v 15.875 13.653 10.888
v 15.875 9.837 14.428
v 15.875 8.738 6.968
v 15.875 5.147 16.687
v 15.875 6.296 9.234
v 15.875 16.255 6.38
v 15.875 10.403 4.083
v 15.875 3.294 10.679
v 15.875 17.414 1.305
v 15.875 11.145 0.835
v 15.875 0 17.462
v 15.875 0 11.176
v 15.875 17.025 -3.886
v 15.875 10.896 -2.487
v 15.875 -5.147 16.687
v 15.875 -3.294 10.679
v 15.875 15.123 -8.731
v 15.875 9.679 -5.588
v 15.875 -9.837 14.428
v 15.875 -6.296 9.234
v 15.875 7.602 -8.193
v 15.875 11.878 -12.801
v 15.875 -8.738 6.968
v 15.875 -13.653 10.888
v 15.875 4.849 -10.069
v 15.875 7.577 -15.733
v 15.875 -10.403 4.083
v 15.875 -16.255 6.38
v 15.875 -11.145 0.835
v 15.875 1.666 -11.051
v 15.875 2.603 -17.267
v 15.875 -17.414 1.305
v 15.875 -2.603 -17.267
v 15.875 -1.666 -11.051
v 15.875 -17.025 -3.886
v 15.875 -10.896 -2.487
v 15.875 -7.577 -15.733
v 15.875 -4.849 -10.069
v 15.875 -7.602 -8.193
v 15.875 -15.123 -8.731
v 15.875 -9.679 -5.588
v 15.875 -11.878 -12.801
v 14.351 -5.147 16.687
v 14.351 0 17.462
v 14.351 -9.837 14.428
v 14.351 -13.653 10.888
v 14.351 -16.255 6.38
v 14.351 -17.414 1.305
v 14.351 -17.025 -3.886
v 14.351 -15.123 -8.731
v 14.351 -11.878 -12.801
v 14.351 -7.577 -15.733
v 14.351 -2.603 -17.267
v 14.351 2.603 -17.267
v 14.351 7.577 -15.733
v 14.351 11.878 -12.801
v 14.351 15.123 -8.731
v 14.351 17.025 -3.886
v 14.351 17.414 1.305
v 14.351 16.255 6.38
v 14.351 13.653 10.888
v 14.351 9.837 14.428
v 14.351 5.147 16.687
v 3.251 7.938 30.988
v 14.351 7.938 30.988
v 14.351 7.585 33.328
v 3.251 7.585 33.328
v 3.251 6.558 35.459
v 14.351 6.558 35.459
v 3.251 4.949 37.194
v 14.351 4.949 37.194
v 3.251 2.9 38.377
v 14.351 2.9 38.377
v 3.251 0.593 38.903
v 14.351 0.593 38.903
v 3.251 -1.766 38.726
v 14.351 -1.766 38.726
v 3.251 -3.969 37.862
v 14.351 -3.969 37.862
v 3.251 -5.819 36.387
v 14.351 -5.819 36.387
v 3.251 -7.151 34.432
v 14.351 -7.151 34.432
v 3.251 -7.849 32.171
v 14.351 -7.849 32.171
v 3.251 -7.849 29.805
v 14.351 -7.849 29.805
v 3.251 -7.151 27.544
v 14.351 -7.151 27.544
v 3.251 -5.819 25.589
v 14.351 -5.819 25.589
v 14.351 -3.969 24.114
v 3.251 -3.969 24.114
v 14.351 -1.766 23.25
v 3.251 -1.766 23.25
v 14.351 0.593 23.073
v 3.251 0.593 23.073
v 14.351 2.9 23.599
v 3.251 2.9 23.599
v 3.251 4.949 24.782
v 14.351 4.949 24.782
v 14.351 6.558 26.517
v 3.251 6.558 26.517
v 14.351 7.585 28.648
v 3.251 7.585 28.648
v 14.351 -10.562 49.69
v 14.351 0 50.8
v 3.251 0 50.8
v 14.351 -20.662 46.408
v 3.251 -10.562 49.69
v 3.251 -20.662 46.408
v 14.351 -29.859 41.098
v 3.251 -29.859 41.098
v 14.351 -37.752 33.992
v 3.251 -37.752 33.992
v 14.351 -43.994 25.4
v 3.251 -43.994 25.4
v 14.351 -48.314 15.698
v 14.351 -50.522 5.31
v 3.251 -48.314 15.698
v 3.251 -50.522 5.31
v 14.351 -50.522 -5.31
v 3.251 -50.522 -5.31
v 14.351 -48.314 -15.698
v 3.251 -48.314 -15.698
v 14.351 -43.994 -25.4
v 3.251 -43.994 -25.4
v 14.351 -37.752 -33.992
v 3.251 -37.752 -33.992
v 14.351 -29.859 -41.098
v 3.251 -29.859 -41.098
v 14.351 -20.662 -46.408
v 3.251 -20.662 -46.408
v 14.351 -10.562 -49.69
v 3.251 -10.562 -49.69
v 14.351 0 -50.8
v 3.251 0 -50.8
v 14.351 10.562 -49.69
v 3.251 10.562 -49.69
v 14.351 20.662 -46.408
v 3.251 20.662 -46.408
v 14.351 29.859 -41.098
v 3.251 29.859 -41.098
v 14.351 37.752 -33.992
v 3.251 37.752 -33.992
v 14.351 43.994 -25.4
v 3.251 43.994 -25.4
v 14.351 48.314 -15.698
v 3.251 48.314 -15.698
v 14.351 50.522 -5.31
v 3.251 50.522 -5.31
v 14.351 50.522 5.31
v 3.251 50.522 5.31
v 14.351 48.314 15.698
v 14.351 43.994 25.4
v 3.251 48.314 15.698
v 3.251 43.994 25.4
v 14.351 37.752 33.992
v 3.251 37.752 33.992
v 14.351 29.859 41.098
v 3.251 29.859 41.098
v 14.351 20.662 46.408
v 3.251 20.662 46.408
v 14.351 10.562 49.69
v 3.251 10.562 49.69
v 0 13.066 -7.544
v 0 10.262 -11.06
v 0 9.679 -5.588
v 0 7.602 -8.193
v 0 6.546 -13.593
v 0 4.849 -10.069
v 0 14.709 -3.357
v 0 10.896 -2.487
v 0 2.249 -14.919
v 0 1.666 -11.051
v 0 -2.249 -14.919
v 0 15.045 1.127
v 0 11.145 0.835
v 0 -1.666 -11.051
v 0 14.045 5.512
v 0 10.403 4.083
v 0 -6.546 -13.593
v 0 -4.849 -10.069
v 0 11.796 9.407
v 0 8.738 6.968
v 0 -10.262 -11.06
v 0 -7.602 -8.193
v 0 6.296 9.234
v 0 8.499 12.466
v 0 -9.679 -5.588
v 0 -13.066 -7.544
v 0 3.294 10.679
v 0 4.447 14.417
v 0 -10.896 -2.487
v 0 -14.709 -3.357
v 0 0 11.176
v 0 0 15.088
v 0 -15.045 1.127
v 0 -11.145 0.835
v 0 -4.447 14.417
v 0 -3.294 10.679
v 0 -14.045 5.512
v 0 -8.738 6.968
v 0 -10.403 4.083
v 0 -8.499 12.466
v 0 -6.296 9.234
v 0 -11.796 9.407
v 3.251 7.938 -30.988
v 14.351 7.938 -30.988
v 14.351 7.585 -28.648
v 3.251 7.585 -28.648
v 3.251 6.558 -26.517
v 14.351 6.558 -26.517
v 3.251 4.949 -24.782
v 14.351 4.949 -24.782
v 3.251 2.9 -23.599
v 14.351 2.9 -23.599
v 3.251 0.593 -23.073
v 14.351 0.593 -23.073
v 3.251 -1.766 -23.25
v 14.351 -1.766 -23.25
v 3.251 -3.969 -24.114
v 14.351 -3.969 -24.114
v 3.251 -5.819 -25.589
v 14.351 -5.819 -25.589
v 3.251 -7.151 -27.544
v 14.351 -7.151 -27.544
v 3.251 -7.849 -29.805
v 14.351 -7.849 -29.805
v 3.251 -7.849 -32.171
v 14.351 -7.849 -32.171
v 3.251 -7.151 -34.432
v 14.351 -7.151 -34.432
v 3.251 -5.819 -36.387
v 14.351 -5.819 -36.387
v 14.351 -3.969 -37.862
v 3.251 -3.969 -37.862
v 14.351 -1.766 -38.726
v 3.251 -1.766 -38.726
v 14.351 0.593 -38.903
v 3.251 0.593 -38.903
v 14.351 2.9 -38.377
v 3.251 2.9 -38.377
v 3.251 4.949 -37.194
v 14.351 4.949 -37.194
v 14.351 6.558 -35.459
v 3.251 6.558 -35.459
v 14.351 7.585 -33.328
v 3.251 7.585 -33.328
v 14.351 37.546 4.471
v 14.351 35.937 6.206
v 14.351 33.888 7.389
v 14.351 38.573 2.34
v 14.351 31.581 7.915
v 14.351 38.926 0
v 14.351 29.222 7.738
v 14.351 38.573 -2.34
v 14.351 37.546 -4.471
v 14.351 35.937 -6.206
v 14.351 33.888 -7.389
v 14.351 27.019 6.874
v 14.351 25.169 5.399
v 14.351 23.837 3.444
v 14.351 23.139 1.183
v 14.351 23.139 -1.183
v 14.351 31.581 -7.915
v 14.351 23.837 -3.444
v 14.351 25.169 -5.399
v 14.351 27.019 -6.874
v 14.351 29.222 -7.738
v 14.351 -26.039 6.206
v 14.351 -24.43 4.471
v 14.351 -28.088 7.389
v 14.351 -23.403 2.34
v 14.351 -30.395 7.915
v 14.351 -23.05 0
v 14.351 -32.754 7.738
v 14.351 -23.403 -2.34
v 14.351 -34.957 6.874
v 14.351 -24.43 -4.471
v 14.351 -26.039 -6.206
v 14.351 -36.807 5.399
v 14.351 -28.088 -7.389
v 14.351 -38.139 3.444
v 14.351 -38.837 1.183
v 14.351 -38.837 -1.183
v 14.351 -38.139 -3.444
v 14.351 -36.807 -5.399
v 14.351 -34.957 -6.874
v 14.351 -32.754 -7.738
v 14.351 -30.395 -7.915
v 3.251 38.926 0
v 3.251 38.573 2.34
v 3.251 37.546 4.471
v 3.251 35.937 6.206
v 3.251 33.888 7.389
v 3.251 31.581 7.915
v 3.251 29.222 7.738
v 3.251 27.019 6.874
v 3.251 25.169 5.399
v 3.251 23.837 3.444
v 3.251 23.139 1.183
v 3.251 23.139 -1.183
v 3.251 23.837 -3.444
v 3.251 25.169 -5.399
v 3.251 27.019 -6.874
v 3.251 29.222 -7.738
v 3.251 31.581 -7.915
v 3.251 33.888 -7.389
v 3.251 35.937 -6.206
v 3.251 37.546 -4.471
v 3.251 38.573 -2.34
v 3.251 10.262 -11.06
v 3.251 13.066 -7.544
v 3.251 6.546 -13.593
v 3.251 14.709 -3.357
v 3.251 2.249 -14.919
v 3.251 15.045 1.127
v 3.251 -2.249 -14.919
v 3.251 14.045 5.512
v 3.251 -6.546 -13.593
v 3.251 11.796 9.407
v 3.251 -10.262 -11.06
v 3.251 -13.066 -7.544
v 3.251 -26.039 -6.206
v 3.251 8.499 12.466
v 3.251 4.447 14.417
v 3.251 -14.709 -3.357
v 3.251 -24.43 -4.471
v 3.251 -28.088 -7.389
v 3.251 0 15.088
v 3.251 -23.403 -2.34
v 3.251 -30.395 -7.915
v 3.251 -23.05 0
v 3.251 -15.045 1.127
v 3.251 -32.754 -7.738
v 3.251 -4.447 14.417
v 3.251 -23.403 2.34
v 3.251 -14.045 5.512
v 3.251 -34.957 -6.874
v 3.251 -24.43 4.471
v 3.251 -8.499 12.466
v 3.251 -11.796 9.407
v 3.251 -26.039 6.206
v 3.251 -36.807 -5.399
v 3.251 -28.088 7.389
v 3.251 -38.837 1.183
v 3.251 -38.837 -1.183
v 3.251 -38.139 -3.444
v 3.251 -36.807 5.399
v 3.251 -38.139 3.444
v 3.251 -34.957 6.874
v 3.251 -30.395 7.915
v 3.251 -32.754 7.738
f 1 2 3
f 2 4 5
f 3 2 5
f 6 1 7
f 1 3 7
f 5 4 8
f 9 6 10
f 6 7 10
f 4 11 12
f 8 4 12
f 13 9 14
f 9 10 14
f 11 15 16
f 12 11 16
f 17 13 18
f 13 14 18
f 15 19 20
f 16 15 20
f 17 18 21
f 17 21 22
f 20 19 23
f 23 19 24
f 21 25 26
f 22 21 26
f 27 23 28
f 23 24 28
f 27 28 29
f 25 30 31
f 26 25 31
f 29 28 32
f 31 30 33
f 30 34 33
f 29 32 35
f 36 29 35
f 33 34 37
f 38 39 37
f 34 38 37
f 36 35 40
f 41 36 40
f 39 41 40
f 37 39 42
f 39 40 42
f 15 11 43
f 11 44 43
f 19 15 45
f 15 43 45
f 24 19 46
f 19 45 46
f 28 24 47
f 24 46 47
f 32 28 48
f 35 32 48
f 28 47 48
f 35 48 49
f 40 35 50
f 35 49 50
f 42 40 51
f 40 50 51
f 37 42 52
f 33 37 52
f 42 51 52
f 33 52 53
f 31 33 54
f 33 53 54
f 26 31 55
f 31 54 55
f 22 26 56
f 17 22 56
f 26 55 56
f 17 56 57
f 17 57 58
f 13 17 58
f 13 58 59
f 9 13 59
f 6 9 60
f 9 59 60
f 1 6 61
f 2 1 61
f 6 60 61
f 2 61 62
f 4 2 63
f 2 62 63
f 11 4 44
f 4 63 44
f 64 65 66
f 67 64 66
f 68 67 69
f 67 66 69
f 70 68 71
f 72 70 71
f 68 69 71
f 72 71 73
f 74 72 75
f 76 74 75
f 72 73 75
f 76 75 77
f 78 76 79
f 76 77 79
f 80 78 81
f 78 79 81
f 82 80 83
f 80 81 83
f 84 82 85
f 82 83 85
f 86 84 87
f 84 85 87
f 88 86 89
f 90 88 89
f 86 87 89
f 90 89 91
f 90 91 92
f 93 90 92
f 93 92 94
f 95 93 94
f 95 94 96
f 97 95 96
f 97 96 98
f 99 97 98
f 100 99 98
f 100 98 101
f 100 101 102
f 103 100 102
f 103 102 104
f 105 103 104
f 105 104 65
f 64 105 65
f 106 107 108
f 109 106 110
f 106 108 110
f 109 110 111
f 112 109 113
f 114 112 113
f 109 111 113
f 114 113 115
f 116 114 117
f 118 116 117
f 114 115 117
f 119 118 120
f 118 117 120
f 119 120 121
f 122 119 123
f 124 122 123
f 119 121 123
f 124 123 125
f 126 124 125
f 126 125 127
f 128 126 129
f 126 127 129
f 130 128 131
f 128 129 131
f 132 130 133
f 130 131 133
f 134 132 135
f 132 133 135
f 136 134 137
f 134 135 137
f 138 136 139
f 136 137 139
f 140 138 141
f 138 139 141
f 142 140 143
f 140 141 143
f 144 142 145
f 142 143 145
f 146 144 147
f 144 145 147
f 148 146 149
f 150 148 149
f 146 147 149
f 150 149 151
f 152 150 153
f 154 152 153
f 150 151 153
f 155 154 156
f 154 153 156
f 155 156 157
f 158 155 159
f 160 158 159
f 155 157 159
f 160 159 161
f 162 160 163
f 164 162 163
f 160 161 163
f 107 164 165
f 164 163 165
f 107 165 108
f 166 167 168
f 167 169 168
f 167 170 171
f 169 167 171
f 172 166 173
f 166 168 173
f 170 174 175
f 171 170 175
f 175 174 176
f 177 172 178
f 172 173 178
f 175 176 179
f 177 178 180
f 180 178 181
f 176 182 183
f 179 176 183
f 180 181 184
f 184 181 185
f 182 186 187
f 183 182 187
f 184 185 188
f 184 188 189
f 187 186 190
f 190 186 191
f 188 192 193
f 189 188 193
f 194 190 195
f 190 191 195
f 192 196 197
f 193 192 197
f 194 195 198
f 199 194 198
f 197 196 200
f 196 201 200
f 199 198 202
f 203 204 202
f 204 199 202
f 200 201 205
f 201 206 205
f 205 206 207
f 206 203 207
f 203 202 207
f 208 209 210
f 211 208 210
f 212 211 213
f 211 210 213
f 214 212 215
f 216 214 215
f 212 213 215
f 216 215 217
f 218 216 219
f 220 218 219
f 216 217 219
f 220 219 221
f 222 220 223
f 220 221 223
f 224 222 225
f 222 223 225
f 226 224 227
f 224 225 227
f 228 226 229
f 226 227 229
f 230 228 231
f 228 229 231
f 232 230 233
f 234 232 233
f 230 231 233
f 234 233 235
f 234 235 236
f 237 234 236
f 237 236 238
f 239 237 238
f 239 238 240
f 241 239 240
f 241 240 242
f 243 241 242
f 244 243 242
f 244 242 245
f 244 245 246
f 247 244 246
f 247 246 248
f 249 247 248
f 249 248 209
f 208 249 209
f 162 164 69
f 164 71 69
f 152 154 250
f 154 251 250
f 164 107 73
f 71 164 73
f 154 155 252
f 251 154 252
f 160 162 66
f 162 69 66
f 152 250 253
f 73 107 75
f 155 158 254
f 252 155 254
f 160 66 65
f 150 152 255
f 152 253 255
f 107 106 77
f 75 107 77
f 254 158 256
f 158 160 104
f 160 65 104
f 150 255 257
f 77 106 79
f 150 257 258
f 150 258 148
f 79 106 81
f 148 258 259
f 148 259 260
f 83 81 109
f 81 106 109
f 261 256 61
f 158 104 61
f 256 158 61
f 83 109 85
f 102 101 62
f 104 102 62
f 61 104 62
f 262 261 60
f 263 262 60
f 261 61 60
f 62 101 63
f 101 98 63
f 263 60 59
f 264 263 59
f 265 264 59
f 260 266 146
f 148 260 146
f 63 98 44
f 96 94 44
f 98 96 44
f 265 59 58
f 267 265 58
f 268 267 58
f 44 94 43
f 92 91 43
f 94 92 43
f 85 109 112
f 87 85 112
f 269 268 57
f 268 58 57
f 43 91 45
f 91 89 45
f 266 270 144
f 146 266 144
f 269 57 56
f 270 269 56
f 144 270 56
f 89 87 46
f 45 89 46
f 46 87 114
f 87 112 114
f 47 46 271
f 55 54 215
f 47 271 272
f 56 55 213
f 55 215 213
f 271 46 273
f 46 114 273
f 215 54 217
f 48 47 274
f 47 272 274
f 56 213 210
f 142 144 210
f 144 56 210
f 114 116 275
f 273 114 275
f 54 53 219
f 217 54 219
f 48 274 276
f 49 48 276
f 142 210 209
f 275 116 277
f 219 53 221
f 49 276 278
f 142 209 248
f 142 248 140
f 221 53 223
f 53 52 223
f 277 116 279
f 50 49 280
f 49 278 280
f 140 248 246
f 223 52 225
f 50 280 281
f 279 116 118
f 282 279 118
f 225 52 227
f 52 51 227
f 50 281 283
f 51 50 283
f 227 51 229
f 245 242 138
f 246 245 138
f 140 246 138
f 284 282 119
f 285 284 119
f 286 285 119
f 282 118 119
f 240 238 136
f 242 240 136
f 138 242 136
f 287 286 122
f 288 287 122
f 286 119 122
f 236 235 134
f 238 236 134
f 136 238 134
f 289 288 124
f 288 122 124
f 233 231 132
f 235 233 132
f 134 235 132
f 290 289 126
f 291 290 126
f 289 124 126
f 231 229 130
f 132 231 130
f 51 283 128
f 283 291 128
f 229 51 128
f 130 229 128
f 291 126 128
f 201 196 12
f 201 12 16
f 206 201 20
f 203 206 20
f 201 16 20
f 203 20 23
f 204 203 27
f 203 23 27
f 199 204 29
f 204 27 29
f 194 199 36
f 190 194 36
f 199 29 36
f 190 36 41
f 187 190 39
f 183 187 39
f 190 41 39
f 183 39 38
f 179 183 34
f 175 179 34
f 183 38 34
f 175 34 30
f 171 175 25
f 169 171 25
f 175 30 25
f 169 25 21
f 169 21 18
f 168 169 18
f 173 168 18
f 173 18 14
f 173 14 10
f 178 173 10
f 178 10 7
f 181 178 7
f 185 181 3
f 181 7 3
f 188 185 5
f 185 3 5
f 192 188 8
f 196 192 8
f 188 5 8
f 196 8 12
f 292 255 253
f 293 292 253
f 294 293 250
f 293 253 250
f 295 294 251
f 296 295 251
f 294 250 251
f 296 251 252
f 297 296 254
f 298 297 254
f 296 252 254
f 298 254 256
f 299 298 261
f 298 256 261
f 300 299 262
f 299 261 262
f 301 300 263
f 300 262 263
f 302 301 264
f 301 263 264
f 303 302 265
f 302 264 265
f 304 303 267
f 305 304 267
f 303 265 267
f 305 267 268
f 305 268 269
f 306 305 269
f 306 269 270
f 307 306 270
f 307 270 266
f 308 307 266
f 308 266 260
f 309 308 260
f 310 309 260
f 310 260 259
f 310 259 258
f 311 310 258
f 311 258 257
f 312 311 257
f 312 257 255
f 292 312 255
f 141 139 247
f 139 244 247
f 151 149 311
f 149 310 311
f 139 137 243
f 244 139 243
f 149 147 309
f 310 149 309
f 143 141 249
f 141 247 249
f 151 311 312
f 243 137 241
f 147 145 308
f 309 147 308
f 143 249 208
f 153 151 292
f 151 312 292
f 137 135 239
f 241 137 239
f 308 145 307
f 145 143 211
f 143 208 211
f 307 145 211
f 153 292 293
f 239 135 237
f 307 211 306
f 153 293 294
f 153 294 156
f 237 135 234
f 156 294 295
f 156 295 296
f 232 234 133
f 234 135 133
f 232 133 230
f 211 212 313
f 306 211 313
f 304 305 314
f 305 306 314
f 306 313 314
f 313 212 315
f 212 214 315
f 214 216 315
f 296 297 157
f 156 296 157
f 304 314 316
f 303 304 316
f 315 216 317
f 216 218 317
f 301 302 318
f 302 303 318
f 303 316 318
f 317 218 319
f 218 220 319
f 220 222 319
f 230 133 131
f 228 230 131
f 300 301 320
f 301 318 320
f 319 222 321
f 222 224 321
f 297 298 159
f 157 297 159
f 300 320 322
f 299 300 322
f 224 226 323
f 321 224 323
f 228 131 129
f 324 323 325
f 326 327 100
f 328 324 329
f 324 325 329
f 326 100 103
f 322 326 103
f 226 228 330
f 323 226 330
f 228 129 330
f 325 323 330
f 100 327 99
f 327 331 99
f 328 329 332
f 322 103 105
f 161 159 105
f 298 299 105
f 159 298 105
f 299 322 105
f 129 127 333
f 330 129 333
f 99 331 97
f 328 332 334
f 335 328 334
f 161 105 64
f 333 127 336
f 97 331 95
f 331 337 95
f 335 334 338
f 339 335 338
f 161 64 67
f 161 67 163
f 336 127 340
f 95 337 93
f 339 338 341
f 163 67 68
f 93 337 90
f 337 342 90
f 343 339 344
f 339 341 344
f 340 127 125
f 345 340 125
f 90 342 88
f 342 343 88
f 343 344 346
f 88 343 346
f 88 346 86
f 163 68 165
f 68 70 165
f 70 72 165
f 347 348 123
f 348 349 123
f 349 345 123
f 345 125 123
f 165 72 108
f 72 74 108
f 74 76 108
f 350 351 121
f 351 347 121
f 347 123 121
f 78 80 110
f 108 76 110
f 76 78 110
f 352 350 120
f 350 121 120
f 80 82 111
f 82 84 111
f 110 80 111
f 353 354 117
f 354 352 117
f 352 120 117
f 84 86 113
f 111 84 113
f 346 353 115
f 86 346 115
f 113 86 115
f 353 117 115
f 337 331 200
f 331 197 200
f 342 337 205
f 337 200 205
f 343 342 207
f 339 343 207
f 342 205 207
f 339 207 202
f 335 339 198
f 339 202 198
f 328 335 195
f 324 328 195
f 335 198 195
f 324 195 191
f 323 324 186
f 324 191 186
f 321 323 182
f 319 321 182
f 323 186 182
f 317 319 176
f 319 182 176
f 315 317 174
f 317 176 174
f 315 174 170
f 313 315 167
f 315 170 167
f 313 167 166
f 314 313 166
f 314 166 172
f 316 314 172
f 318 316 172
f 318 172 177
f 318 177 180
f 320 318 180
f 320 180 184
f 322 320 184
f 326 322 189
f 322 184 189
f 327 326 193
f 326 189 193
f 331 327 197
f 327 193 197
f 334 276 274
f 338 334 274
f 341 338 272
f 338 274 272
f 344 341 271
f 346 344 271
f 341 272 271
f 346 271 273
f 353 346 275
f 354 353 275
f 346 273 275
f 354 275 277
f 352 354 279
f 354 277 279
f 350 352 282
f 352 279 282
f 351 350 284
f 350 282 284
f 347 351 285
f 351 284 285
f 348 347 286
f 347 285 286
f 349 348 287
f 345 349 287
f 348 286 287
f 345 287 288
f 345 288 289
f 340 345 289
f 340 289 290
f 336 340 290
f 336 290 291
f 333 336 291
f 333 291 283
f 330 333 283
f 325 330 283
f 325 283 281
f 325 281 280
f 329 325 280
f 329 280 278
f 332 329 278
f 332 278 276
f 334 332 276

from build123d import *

# Parameters (mm, degrees)
F2_R     = 7.9375
F3_DEPTH = 14.352


with BuildPart() as f1:
    # F0 (on Front) → F1 (revolve)
    with BuildSketch(Plane.XZ):
        Polygon((3.2512, 15.0876), (0, 15.0876), (0, 11.176), (15.875, 11.176), (15.875, 17.4625), (14.351, 17.4625), (14.351, 50.8), (3.2512, 50.8), align=None)
    revolve(axis=Axis((-0.422707, 0, 0), (1, 0, 0)))

    # F2 (on face) → F3 (cut, through all)
    with BuildSketch(Plane.YZ.offset(14.351)):
        with Locations((0, 30.988)):
            Circle(F2_R)
        with Locations((-30.988, 0)):
            Circle(F2_R)
        with Locations((0, -30.988)):
            Circle(F2_R)
        with Locations((30.988, 0)):
            Circle(F2_R)
    extrude(amount=-F3_DEPTH, mode=Mode.SUBTRACT)


solid = f1.part
